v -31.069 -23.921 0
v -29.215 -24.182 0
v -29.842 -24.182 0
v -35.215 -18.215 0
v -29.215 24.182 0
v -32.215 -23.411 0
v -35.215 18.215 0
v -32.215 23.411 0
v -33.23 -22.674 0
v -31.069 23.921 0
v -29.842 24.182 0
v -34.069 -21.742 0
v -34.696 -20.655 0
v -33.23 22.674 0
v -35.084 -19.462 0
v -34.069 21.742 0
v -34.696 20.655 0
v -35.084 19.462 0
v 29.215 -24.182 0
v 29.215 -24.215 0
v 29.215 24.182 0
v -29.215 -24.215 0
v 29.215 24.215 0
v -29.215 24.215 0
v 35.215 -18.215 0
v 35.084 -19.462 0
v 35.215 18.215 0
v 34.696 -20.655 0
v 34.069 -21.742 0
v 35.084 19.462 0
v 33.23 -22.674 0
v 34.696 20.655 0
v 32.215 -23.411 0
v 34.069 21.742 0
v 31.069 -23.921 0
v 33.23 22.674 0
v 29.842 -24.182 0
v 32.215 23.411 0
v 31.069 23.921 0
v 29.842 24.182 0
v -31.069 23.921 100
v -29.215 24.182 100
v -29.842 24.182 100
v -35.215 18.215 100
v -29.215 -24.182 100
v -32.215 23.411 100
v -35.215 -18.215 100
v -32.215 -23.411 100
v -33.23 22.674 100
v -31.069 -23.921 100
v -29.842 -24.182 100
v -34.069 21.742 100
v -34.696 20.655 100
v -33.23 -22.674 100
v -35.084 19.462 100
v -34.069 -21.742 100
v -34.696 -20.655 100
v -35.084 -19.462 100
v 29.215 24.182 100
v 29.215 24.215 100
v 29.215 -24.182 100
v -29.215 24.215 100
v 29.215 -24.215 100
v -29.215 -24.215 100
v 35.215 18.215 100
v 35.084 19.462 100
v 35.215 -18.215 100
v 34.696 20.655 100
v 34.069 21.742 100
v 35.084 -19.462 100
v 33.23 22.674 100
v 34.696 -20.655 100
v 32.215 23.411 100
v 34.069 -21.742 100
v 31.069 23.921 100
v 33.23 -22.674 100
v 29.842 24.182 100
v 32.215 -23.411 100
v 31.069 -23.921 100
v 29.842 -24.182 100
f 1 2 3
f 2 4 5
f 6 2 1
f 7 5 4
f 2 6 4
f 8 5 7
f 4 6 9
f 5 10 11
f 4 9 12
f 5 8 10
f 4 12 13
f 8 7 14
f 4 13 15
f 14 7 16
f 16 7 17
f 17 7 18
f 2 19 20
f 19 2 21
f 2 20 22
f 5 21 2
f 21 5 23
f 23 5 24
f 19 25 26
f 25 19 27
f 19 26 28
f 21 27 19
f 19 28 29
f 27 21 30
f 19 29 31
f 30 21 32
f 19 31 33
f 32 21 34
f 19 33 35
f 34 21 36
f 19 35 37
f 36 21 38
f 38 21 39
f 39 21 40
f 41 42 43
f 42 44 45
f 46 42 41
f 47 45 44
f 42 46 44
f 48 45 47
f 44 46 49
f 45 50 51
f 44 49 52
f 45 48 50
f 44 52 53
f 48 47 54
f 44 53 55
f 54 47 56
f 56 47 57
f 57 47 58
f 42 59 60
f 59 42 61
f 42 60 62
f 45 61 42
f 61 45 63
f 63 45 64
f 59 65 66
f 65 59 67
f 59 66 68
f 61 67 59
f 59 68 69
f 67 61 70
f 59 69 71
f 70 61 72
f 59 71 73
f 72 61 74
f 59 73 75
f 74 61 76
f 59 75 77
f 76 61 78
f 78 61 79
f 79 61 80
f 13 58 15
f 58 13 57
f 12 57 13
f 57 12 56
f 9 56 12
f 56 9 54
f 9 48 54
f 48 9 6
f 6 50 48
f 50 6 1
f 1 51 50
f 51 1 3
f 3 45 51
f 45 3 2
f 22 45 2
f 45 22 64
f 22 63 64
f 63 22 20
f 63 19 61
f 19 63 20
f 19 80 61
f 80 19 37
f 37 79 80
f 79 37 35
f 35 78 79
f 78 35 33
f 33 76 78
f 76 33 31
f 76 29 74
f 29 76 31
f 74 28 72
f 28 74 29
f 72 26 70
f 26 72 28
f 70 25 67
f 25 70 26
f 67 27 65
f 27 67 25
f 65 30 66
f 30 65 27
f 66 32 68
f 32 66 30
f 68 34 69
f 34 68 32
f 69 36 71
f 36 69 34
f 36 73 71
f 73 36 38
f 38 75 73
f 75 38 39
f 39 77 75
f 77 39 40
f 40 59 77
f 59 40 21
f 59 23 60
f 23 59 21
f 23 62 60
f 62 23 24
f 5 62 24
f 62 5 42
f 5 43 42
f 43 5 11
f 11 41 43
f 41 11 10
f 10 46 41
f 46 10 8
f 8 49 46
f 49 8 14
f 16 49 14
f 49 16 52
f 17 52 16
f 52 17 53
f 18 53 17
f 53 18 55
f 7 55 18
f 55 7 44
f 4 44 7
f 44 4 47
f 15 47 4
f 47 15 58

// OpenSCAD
// file: parameters.scad
// Parameters shared between modules
Base_th = 4;
Beam_width = 15;
Wiggle = 0.25;
Fat_beam_width = Beam_width + Wiggle;
Beam_length = 400;
Wall_th = 2.5;
Min_beam_width = 12.5;
Max_beam_width = 17.5;
Zip_th = 2;
Zip_h = Zip_th + Max_beam_width - Min_beam_width;
Zip_w = 5.0;
Nema17_cube_width          = 42.43;
Nema17_screw_hole_width    = 43.74; // Opposite corner screws
Nema17_ring_diameter       = 22;
Nema17_cube_height         = 39.36;
Nema17_shaft_height        = 63.65;
Nema17_ring_height         = 2;
Nema17_shaft_radius        = 5/2;
b608_outer_dia = 22.2;
b608_width = 7.05;
Gap_between_sandwich_and_plate = 1.5 + Base_th; // 1.5 mm for wiggle
Motor_bracket_flerp_r = 6;
Motor_bracket_flerp = 14;
Motor_bracket_cw = Nema17_cube_width + 6;
Motor_bracket_att_ang = 50;
Mounting_screw_d = 4.5;
Mounting_screw_head_d = 14;
Spool_outer_wall_th = 4;

// Corner clamp parameters
Cc_l1 = (Fat_beam_width+2*Wall_th)*2*sqrt(3);
Cc_rad_b = 4;
Cc_action_point_from_mid = Cc_l1/sqrt(3)-2*Cc_rad_b-1.3;  // 1.3 chosen arbitrarily
Cc_plastic_length = sqrt(Cc_action_point_from_mid*Cc_action_point_from_mid
                       - (Cc_action_point_from_mid/2)*(Cc_action_point_from_mid/2));

// The distance between the two action points on the mover
Sidelength = Beam_length + 2*Cc_plastic_length;

/////// Layout parameters ////////////
Ext_sidelength = Sidelength+77;
Additional_added_plate_side_length = 10;
Yshift_top_plate = -25;

/////// Gear parameters ////////////
Circular_pitch = 262;
Motor_teeth = 10;
Gear_height = 21.4-3;
Motor_pitch                      = (Motor_teeth*Circular_pitch/360);
Motor_pitch_diametrial           = Motor_teeth/(2*Motor_pitch);
Motor_outer_radius               = Motor_pitch + 1/Motor_pitch_diametrial;
Spool_teeth = 100;
Spool_r = 65;
Spool_height = 8;
Spool_pitch                      = (Spool_teeth*Circular_pitch/360);
Spool_pitch_diametrial           = Spool_teeth/(2*Spool_pitch);
Spool_outer_radius               = Spool_pitch + 1/Spool_pitch_diametrial;
Sep_disc_radius = 161.83/2; // Made to match 255 teeth gt2 pulley
Motor_bracket_depth = Gear_height+1+7+Nema17_ring_height+1+Gap_between_sandwich_and_plate;
Spool_core_flerp0 = 16+3;

/////// Lineroller parameters ////////////
b623_width  = 4;
b623_bore_r = 3/2;
b623_vgroove_big_r = 12/2;
b623_vgroove_small_r = 10/2;
b623_outer_dia = 10;
Lineroller_wall_th = 2.3;


// The height that lineroller_ABC_winch will have if we include the bearing
Tower_h = Gap_between_sandwich_and_plate+Gear_height
         + Spool_height/2
         + b623_vgroove_small_r
         + b623_vgroove_big_r;
Bearing_wall = 1;
Depth_of_lineroller_tower = b623_width + 2*Wall_th; // 9
Depth_of_lineroller_base = Depth_of_lineroller_tower + 9; // 18
Ptfe_r = 2.1;
Lineroller_base_r = 8;
Screw_h = 2;
Screw_head_h = 2;
Spool_center_bearing_wall_th = 5;
Corner_clamp_bearings_center_to_center = 15;
Anchor_bearings_center_to_center = Corner_clamp_bearings_center_to_center + b623_outer_dia;

//// Lineroller anchor parameters /////

Bearing_0_x = 2*b623_vgroove_big_r+Bearing_wall+5.3;
Bearing_1_x = b623_vgroove_small_r-0.9;
Move_tower = -12.2;
Lower_bearing_z = 13;
Higher_bearing_z = Lower_bearing_z + Corner_clamp_bearings_center_to_center;


//// Donkey and encoder parameters /////

Donkey_shaft_d = 6;
Donkey_h = 65.12;
Donkey_body_d = 50;
Donkey_feet_th = 3.5;

Encoder_LDP3806_shaft_d = 6;
Encoder_LDP3806_d = 38;


//// Cable Clamp parameters /////
Bit_width = 12;
Cable_r=2.5;

GT2_belt_width = 6;
GT2_gear_height = GT2_belt_width + 2;
GT2_spool_gear_teeth = 252;
GT2_teeth = 255;
GT2_tensioner_h = 36;
Torx_depth = GT2_gear_height/2;
// main file
include <parameters.scad>
use <util.scad>

motor_bracket_2d();
module motor_bracket_2d(){
  x_l = Nema17_cube_width+2*Motor_bracket_flerp;
  y_l = Motor_bracket_cw;
  difference(){
    translate([-x_l/2, -y_l/2,0])
      rounded_cube2([x_l,y_l], Motor_bracket_flerp_r);
    for(mirr=[[0,0], [1,0], [0,1]])
      mirror(mirr)
        translate([x_l/2-Motor_bracket_flerp/2+1,y_l/2-Motor_bracket_flerp/2])
          circle(d=Mounting_screw_d+0.5);
    rotate([0,0,Motor_bracket_att_ang])
      translate([-(Spool_pitch+Motor_pitch),0])
        circle(r=Spool_outer_radius+1.5, center=true, $fn = 50);
  }
}
